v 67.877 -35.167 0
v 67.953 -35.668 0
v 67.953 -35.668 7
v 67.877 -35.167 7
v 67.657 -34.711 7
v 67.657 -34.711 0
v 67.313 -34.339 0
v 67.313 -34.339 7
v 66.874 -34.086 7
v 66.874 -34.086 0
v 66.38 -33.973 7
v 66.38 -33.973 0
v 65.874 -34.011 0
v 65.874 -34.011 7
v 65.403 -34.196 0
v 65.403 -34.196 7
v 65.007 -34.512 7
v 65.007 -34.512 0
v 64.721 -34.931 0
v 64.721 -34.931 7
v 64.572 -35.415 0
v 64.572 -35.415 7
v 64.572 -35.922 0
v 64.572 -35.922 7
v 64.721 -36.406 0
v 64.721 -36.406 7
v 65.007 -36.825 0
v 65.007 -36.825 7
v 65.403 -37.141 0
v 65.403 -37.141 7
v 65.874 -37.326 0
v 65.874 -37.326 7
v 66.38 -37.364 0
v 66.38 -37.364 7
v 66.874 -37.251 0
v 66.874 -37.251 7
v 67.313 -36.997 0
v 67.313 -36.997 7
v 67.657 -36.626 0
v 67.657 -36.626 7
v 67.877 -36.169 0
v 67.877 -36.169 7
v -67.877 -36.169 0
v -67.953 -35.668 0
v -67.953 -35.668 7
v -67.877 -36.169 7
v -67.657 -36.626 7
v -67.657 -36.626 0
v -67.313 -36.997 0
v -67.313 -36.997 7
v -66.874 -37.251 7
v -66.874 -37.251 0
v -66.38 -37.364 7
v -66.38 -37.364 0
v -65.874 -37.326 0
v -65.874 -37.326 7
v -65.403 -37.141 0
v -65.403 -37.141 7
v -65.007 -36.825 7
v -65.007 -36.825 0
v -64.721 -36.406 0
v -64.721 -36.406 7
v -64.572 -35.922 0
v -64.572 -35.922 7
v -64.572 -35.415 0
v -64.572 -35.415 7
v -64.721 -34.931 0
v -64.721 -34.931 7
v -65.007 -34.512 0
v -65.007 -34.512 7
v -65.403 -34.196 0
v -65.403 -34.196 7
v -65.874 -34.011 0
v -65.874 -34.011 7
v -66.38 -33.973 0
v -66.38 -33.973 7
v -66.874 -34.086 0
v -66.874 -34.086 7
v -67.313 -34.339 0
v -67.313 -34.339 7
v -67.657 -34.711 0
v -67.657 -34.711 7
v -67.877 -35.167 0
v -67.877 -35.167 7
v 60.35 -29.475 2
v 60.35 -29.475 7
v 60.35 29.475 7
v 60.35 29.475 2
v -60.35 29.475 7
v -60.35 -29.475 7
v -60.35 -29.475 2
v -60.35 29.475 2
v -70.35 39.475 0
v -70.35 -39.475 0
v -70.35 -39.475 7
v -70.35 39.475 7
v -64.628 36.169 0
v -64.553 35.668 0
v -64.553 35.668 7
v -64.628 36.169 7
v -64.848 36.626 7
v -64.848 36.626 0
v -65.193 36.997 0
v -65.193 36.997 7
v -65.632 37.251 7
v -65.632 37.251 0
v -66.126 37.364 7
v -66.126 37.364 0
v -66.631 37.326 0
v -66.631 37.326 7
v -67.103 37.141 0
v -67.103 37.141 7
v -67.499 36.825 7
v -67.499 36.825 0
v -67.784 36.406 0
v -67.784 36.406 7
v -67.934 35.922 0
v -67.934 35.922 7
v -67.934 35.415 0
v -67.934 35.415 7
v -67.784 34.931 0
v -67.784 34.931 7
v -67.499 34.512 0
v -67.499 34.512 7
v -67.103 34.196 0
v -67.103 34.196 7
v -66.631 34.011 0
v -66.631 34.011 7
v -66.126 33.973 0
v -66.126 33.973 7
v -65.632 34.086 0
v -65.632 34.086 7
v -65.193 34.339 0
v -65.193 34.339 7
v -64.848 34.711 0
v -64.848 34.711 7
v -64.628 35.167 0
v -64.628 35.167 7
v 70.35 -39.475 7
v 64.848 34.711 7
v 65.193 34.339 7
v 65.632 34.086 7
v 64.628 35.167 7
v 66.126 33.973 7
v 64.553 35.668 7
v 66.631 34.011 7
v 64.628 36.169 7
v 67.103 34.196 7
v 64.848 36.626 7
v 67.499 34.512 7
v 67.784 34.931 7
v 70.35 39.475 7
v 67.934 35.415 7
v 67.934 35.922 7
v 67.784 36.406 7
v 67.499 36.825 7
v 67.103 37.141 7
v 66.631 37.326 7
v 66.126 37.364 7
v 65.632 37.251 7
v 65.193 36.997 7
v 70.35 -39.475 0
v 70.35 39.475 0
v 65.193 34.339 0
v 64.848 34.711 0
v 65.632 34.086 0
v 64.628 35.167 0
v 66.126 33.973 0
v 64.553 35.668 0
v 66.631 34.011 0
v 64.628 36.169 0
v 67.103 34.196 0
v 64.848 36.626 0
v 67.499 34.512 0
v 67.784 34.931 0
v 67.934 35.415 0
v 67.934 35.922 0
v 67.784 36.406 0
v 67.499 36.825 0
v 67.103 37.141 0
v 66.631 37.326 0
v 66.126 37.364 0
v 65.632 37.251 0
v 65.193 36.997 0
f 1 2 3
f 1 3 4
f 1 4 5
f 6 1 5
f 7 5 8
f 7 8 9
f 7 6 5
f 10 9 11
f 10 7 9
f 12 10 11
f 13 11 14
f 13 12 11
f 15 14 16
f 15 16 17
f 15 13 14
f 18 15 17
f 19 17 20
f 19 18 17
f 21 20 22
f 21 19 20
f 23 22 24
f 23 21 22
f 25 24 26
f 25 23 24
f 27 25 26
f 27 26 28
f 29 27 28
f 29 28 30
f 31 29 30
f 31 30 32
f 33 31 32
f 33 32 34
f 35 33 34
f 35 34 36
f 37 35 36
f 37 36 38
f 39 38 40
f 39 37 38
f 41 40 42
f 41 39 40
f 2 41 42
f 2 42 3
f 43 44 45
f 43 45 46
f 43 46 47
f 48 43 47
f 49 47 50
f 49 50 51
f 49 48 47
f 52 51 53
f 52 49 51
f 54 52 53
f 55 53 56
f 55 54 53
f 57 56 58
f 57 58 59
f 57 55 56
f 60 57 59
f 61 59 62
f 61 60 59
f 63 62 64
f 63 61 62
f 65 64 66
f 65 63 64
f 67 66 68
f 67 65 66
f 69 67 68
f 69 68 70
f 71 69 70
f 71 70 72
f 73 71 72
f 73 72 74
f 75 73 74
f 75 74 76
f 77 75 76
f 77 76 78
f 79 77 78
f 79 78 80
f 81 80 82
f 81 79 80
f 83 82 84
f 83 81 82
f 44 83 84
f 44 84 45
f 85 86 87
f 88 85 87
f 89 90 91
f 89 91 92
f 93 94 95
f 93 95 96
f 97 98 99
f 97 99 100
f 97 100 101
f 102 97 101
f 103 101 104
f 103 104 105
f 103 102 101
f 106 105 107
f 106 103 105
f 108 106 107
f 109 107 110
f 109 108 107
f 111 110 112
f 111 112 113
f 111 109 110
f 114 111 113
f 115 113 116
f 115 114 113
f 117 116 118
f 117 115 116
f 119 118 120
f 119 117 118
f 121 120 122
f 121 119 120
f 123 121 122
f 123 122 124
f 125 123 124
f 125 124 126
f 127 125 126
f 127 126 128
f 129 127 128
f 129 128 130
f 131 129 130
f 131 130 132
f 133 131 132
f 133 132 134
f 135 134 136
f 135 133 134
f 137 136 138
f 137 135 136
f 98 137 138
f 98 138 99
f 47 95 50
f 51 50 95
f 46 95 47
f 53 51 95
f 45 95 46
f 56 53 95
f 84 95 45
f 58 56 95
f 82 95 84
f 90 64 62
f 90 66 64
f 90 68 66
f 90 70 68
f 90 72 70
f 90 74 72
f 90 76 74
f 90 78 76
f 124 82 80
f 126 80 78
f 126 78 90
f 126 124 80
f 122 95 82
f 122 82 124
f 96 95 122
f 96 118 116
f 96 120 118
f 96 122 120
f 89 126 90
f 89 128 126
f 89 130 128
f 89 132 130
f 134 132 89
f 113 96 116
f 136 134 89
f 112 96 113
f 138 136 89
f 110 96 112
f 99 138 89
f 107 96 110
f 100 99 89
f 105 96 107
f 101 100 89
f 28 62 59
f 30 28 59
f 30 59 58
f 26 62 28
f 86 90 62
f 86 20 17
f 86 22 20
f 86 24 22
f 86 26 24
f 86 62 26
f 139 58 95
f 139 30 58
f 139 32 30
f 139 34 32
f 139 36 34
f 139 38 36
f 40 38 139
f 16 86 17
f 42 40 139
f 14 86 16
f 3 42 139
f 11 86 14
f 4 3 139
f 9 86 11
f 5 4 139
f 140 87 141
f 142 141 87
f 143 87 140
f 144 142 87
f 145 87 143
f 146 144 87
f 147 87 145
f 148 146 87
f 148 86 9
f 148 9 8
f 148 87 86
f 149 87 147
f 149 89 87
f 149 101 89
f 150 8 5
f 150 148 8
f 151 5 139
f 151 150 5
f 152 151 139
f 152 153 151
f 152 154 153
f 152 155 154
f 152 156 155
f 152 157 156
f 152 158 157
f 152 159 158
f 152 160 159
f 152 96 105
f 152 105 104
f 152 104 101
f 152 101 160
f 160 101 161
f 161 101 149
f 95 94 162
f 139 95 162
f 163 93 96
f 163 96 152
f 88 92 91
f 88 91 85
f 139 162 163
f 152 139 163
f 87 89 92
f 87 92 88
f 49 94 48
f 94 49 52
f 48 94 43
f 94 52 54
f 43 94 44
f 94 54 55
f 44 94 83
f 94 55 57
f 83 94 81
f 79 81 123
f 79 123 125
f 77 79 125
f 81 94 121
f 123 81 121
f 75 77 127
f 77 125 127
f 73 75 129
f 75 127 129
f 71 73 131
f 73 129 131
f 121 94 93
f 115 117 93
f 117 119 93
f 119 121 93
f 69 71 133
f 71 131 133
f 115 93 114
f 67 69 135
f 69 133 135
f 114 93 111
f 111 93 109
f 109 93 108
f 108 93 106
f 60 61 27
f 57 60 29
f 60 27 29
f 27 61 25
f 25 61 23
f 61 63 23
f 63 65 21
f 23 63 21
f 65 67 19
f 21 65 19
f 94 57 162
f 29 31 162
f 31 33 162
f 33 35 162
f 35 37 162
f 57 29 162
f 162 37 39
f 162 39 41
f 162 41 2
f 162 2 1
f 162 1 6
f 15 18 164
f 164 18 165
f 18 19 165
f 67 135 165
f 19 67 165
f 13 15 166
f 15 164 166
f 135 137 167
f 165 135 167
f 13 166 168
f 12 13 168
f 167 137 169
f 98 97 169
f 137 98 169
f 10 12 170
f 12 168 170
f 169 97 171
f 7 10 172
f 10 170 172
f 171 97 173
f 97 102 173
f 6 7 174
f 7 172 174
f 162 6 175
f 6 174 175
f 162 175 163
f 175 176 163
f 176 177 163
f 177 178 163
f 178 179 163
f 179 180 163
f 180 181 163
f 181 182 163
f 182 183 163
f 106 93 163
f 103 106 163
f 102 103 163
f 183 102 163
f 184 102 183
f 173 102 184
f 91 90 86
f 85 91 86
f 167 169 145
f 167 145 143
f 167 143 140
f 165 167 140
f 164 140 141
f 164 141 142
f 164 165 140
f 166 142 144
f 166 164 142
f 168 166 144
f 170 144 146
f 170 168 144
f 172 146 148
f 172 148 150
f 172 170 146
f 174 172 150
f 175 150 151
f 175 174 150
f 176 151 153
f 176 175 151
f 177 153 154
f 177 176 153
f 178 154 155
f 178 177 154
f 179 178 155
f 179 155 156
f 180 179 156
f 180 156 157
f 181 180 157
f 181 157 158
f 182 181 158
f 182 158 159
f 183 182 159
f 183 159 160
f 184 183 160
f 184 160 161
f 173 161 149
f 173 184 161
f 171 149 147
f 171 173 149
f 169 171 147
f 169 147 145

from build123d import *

# Parameters (mm, degrees)
SKETCH_1_W          = 140.7
SKETCH_1_H          = 78.95
SKETCH_1_R          = 1.7
EXTRUDE_1_DEPTH     = 7
SKETCH_2_W          = 120.7
SKETCH_2_H          = 58.95
CUT_EXTRUDE_1_DEPTH = 5


with BuildPart() as part:
    # 草图1 → 凸台-拉伸1 (new body)
    with BuildSketch(Plane.XY):
        Rectangle(SKETCH_1_W, SKETCH_1_H)
        with Locations((-66.25272379, 35.66826865)):
            Circle(SKETCH_1_R, mode=Mode.SUBTRACT)
        with Locations(Location((66.25272379, 35.66826865, 0), (0, 0, 180))):
            Circle(SKETCH_1_R, mode=Mode.SUBTRACT)
        with Locations((66.25272379, -35.66826865)):
            Circle(SKETCH_1_R, mode=Mode.SUBTRACT)
        with Locations(Location((-66.25272379, -35.66826865, 0), (0, 0, 180))):
            Circle(SKETCH_1_R, mode=Mode.SUBTRACT)
    extrude(amount=EXTRUDE_1_DEPTH)

    # 草图2 → 切除-拉伸1 (cut)
    with BuildSketch(Plane.XY.offset(7)):
        Rectangle(SKETCH_2_W, SKETCH_2_H)
    extrude(amount=-CUT_EXTRUDE_1_DEPTH, mode=Mode.SUBTRACT)


solid = part.part
